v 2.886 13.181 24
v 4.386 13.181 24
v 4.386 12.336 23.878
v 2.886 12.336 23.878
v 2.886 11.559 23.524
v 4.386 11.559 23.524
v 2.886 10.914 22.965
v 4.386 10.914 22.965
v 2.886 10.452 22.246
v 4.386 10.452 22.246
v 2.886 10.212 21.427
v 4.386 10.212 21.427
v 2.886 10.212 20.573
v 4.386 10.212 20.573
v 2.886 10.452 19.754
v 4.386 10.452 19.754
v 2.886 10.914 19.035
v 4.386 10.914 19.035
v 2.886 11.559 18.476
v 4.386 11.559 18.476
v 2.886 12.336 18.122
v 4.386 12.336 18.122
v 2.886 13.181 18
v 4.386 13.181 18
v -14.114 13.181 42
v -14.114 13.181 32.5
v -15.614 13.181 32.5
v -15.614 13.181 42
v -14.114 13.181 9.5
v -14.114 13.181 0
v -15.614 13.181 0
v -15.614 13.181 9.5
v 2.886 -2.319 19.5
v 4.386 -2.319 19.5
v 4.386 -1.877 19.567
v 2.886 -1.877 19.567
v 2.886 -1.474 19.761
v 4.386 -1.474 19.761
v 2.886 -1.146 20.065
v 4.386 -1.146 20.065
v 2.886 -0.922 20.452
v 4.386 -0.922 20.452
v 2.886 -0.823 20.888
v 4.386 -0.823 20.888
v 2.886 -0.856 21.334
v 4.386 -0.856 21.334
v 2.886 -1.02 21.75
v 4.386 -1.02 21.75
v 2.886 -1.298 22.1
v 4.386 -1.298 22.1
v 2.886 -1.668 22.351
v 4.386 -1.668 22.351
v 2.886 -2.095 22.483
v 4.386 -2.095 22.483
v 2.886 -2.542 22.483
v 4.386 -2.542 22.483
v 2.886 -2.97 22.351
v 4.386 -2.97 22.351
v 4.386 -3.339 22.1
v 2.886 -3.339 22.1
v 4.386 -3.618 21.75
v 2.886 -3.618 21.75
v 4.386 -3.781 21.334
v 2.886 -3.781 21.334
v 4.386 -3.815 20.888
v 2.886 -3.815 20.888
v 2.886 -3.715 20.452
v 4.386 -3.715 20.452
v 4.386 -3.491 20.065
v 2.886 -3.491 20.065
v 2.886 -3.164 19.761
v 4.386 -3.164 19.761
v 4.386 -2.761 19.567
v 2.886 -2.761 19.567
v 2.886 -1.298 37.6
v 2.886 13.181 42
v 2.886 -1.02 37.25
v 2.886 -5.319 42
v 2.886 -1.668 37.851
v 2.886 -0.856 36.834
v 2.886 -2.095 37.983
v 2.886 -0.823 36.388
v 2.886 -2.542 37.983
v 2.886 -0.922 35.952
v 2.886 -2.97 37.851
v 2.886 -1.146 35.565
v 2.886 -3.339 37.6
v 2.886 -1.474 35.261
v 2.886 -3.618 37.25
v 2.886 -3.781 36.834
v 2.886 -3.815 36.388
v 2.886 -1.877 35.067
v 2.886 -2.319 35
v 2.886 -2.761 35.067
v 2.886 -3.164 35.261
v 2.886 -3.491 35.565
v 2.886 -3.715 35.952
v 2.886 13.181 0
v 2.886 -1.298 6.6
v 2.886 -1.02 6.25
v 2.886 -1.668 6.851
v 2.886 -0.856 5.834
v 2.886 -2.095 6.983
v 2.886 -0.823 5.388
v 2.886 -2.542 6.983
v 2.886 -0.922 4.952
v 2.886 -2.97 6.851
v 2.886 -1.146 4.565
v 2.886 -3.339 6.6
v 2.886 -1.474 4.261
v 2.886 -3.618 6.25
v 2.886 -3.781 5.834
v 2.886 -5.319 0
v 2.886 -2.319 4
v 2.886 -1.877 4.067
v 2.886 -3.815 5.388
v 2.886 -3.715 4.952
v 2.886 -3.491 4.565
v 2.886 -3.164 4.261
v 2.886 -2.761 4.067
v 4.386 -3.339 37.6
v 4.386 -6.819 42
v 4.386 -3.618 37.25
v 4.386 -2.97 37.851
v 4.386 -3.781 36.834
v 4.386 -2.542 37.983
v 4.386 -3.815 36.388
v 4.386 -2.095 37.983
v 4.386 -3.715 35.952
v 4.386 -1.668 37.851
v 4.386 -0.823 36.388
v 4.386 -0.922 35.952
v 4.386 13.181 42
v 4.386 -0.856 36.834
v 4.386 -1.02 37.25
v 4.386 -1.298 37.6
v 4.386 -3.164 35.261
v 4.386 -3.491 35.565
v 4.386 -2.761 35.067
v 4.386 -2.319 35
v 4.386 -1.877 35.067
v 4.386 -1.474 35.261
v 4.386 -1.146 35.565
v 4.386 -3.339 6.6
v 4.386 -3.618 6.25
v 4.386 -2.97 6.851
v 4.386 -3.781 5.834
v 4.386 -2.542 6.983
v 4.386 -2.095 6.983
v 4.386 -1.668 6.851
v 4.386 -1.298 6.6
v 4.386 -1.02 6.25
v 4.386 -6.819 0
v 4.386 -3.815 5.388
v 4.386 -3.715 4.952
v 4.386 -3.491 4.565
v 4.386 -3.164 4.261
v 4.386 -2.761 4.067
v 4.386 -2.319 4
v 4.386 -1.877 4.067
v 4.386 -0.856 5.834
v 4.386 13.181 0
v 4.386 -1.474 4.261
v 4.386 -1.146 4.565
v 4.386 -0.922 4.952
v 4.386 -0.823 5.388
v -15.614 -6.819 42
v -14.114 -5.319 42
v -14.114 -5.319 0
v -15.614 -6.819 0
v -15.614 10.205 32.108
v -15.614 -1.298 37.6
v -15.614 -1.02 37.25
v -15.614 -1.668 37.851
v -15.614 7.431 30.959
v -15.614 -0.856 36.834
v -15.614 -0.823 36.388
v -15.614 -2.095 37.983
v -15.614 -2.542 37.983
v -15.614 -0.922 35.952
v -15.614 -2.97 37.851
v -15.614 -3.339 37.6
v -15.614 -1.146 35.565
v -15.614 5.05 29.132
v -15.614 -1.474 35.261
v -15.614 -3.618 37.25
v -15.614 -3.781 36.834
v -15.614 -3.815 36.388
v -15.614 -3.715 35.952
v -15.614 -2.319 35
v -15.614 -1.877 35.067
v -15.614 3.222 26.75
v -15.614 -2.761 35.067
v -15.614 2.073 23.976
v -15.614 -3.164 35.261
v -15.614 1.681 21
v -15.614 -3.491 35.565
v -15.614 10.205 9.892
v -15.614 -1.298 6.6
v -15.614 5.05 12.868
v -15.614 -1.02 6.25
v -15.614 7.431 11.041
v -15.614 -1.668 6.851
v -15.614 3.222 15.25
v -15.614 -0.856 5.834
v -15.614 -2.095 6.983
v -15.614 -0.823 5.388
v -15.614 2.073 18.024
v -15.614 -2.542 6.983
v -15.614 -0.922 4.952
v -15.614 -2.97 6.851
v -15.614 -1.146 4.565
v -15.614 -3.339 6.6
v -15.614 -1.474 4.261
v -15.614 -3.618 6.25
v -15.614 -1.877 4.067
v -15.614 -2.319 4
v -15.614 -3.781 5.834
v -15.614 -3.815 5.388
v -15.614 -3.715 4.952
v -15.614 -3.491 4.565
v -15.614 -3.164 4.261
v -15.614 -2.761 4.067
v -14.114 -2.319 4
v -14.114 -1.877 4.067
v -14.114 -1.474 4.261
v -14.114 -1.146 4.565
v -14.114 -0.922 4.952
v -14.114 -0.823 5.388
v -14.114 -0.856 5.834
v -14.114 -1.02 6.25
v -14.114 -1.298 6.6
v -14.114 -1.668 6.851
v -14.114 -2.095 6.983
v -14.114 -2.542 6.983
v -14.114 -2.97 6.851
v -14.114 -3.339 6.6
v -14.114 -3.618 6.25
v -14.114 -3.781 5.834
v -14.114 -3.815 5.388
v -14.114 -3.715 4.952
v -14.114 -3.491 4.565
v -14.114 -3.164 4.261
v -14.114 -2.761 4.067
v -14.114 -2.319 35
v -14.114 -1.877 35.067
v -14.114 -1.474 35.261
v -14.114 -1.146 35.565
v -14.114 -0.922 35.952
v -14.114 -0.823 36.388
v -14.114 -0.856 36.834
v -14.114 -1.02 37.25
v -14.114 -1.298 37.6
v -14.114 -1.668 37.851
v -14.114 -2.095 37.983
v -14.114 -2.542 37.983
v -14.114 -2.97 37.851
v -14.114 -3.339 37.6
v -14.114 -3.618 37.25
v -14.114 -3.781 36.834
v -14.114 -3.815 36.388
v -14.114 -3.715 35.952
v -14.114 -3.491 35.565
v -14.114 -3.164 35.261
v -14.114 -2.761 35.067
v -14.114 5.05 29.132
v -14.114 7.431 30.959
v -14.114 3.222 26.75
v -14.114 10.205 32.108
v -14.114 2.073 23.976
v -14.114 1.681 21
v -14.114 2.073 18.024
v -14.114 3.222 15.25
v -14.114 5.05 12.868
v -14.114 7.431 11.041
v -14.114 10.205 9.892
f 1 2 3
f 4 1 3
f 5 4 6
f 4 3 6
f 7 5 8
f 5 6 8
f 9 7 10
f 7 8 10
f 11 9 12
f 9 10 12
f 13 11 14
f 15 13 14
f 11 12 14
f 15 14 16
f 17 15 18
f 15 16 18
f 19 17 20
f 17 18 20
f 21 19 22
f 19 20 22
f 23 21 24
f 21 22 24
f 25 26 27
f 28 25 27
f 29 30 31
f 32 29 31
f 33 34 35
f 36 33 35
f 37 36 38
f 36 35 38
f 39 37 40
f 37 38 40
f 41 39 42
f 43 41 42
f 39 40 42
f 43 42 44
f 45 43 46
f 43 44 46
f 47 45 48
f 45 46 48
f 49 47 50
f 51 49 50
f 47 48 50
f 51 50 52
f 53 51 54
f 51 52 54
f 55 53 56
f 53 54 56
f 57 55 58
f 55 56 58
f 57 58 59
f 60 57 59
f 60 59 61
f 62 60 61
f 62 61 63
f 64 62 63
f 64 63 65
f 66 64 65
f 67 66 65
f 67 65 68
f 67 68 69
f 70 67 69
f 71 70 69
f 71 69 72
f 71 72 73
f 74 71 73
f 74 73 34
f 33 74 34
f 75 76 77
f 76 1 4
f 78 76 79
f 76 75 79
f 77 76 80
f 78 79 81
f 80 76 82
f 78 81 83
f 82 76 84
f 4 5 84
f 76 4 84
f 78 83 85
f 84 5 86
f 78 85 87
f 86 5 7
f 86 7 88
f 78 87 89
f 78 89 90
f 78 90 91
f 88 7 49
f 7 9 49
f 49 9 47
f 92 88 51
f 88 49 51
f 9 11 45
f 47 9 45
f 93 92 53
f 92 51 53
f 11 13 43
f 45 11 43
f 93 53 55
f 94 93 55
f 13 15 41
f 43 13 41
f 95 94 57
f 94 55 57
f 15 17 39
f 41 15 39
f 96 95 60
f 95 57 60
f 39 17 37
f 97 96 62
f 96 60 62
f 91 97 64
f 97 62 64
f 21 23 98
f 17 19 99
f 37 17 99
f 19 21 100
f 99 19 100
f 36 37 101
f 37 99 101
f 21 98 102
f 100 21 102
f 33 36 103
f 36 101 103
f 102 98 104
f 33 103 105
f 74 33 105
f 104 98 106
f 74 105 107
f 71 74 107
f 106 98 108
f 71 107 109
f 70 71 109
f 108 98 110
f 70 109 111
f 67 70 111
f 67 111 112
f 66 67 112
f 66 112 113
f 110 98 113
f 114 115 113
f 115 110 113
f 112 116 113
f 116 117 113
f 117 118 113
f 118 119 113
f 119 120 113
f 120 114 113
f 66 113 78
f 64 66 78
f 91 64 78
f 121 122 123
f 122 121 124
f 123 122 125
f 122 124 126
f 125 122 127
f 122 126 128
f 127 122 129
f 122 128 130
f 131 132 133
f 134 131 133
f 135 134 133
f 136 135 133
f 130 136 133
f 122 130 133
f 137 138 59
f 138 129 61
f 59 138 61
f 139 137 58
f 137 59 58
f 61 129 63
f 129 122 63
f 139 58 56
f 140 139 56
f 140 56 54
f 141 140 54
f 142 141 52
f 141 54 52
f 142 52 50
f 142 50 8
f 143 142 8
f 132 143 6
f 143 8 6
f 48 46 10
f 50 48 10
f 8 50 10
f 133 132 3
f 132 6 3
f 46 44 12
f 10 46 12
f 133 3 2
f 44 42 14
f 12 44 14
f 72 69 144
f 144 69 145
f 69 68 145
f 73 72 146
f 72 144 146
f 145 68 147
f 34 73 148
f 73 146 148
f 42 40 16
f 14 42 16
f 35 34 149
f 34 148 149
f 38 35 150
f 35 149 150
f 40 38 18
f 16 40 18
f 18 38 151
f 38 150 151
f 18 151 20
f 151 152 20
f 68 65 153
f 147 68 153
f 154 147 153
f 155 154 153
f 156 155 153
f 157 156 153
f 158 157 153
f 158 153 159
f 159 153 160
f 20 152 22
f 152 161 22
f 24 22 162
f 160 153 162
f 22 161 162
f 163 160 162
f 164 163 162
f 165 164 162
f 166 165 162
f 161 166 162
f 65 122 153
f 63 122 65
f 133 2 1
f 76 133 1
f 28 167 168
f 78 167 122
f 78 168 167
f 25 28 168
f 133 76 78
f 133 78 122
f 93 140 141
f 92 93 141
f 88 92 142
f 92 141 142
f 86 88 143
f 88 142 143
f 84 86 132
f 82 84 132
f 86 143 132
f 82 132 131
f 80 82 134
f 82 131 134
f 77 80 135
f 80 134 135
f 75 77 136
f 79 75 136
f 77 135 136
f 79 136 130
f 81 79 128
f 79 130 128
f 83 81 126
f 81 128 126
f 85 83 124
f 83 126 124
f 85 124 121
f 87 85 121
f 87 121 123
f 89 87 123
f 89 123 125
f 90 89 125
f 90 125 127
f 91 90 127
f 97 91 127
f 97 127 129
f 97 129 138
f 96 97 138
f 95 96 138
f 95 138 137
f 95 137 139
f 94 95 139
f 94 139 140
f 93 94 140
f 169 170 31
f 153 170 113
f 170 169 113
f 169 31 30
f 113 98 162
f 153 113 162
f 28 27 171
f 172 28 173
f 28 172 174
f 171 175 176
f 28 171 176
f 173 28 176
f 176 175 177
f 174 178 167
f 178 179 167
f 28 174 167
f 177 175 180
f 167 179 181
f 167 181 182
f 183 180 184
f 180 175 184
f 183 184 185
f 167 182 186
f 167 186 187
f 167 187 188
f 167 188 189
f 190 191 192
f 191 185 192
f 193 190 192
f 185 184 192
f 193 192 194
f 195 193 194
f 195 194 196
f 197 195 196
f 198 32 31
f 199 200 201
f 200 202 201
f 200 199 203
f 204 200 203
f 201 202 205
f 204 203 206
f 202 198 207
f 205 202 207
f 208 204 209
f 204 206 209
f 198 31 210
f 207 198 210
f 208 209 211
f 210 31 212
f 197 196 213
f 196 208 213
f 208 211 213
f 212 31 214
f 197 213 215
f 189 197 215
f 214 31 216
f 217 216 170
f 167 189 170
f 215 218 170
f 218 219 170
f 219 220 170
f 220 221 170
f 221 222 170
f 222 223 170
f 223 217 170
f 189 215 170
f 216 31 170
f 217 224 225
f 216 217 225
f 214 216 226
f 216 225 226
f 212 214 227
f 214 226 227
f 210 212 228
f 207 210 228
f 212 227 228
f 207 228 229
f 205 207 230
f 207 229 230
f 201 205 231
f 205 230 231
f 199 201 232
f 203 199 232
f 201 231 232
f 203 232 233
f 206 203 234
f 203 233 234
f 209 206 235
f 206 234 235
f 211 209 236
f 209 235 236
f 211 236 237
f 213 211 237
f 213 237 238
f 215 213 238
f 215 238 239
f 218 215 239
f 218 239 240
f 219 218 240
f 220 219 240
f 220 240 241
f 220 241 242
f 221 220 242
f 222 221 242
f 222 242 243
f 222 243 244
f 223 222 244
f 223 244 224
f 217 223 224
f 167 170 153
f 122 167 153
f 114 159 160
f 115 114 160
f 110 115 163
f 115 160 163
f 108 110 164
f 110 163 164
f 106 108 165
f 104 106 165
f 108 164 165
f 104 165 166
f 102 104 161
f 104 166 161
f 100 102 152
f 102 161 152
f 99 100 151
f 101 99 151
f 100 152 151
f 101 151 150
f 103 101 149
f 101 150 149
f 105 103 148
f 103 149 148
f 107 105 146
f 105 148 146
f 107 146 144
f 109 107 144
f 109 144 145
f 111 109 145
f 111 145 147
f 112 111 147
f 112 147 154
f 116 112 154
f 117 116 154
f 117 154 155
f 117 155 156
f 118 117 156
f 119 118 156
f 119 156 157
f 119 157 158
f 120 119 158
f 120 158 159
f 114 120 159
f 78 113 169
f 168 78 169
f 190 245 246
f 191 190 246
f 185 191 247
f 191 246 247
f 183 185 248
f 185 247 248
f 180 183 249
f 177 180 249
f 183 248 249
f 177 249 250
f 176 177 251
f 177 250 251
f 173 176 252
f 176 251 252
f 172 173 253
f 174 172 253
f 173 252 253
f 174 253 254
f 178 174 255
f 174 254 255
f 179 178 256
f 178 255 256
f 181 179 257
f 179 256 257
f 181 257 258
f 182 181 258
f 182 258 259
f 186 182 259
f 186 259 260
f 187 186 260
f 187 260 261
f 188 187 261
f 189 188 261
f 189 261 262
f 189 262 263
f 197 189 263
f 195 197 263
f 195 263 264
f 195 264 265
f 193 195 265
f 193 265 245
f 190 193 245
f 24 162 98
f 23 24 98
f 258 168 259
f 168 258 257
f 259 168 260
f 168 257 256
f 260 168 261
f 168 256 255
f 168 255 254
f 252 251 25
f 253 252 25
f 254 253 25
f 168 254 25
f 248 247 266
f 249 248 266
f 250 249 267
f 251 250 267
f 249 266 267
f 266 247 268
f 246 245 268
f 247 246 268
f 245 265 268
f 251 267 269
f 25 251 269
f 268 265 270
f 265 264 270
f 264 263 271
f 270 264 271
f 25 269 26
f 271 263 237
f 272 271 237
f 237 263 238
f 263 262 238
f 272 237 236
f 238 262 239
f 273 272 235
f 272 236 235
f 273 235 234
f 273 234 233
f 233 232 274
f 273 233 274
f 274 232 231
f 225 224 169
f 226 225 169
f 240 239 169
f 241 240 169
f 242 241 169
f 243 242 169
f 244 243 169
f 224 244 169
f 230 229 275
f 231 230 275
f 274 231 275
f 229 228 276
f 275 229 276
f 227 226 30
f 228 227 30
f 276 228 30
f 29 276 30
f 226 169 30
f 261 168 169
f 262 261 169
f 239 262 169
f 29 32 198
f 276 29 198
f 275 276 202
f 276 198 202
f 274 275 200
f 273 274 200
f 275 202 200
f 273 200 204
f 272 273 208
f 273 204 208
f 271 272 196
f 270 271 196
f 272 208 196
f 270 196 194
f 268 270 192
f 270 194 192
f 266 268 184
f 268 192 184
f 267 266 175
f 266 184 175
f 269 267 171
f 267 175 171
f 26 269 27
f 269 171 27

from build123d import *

# Parameters (mm, degrees)
EXTRUSION1_DEPTH = 42
ESQUISSE2_R      = 1.5
EXTRUSION2_DEPTH = 49.350239901
ESQUISSE3_R      = 1.5
EXTRUSION3_DEPTH = 10
ESQUISSE4_R      = 11.5
EXTRUSION4_DEPTH = 10
ESQUISSE5_R      = 3
EXTRUSION5_DEPTH = 10


with BuildPart() as part:
    # Esquisse1 → Extrusion1 (new body)
    with BuildSketch(Plane.XY):
        Polygon((-15.613581117, 13.181263158), (-15.613581117, -6.818736842), (4.386418883, -6.818736842), (4.386418883, 13.181263158), (2.886418883, 13.181263158), (2.886418883, -5.318736842), (-14.113581117, -5.318736842), (-14.113581117, 13.181263158), align=None)
    extrude(amount=EXTRUSION1_DEPTH)

    # Esquisse2 → Extrusion2 (cut, through all)
    with BuildSketch(Plane(origin=(4.386418883, 0, 0), x_dir=(0, 0, -1), z_dir=(1, 0, 0))):
        with Locations((-36.5, -2.318736842)):
            Circle(ESQUISSE2_R)
        with Locations((-5.5, -2.318736842)):
            Circle(ESQUISSE2_R)
    extrude(amount=-EXTRUSION2_DEPTH, mode=Mode.SUBTRACT)

    # Esquisse3 → Extrusion3 (cut)
    with BuildSketch(Plane(origin=(4.386418883, 0, 0), x_dir=(0, 0, -1), z_dir=(1, 0, 0))):
        with Locations((-21, -2.318736842)):
            Circle(ESQUISSE3_R)
    extrude(amount=-EXTRUSION3_DEPTH, mode=Mode.SUBTRACT)

    # Esquisse4 → Extrusion4 (cut)
    with BuildSketch(Plane.ZY.offset(15.613581117)):
        with Locations((21, 13.181263158)):
            Circle(ESQUISSE4_R)
    extrude(amount=-EXTRUSION4_DEPTH, mode=Mode.SUBTRACT)

    # Esquisse5 → Extrusion5 (cut)
    with BuildSketch(Plane(origin=(4.386418883, 0, 0), x_dir=(0, 0, -1), z_dir=(1, 0, 0))):
        with Locations((-21, 13.181263158)):
            Circle(ESQUISSE5_R)
    extrude(amount=-EXTRUSION5_DEPTH, mode=Mode.SUBTRACT)


solid = part.part
